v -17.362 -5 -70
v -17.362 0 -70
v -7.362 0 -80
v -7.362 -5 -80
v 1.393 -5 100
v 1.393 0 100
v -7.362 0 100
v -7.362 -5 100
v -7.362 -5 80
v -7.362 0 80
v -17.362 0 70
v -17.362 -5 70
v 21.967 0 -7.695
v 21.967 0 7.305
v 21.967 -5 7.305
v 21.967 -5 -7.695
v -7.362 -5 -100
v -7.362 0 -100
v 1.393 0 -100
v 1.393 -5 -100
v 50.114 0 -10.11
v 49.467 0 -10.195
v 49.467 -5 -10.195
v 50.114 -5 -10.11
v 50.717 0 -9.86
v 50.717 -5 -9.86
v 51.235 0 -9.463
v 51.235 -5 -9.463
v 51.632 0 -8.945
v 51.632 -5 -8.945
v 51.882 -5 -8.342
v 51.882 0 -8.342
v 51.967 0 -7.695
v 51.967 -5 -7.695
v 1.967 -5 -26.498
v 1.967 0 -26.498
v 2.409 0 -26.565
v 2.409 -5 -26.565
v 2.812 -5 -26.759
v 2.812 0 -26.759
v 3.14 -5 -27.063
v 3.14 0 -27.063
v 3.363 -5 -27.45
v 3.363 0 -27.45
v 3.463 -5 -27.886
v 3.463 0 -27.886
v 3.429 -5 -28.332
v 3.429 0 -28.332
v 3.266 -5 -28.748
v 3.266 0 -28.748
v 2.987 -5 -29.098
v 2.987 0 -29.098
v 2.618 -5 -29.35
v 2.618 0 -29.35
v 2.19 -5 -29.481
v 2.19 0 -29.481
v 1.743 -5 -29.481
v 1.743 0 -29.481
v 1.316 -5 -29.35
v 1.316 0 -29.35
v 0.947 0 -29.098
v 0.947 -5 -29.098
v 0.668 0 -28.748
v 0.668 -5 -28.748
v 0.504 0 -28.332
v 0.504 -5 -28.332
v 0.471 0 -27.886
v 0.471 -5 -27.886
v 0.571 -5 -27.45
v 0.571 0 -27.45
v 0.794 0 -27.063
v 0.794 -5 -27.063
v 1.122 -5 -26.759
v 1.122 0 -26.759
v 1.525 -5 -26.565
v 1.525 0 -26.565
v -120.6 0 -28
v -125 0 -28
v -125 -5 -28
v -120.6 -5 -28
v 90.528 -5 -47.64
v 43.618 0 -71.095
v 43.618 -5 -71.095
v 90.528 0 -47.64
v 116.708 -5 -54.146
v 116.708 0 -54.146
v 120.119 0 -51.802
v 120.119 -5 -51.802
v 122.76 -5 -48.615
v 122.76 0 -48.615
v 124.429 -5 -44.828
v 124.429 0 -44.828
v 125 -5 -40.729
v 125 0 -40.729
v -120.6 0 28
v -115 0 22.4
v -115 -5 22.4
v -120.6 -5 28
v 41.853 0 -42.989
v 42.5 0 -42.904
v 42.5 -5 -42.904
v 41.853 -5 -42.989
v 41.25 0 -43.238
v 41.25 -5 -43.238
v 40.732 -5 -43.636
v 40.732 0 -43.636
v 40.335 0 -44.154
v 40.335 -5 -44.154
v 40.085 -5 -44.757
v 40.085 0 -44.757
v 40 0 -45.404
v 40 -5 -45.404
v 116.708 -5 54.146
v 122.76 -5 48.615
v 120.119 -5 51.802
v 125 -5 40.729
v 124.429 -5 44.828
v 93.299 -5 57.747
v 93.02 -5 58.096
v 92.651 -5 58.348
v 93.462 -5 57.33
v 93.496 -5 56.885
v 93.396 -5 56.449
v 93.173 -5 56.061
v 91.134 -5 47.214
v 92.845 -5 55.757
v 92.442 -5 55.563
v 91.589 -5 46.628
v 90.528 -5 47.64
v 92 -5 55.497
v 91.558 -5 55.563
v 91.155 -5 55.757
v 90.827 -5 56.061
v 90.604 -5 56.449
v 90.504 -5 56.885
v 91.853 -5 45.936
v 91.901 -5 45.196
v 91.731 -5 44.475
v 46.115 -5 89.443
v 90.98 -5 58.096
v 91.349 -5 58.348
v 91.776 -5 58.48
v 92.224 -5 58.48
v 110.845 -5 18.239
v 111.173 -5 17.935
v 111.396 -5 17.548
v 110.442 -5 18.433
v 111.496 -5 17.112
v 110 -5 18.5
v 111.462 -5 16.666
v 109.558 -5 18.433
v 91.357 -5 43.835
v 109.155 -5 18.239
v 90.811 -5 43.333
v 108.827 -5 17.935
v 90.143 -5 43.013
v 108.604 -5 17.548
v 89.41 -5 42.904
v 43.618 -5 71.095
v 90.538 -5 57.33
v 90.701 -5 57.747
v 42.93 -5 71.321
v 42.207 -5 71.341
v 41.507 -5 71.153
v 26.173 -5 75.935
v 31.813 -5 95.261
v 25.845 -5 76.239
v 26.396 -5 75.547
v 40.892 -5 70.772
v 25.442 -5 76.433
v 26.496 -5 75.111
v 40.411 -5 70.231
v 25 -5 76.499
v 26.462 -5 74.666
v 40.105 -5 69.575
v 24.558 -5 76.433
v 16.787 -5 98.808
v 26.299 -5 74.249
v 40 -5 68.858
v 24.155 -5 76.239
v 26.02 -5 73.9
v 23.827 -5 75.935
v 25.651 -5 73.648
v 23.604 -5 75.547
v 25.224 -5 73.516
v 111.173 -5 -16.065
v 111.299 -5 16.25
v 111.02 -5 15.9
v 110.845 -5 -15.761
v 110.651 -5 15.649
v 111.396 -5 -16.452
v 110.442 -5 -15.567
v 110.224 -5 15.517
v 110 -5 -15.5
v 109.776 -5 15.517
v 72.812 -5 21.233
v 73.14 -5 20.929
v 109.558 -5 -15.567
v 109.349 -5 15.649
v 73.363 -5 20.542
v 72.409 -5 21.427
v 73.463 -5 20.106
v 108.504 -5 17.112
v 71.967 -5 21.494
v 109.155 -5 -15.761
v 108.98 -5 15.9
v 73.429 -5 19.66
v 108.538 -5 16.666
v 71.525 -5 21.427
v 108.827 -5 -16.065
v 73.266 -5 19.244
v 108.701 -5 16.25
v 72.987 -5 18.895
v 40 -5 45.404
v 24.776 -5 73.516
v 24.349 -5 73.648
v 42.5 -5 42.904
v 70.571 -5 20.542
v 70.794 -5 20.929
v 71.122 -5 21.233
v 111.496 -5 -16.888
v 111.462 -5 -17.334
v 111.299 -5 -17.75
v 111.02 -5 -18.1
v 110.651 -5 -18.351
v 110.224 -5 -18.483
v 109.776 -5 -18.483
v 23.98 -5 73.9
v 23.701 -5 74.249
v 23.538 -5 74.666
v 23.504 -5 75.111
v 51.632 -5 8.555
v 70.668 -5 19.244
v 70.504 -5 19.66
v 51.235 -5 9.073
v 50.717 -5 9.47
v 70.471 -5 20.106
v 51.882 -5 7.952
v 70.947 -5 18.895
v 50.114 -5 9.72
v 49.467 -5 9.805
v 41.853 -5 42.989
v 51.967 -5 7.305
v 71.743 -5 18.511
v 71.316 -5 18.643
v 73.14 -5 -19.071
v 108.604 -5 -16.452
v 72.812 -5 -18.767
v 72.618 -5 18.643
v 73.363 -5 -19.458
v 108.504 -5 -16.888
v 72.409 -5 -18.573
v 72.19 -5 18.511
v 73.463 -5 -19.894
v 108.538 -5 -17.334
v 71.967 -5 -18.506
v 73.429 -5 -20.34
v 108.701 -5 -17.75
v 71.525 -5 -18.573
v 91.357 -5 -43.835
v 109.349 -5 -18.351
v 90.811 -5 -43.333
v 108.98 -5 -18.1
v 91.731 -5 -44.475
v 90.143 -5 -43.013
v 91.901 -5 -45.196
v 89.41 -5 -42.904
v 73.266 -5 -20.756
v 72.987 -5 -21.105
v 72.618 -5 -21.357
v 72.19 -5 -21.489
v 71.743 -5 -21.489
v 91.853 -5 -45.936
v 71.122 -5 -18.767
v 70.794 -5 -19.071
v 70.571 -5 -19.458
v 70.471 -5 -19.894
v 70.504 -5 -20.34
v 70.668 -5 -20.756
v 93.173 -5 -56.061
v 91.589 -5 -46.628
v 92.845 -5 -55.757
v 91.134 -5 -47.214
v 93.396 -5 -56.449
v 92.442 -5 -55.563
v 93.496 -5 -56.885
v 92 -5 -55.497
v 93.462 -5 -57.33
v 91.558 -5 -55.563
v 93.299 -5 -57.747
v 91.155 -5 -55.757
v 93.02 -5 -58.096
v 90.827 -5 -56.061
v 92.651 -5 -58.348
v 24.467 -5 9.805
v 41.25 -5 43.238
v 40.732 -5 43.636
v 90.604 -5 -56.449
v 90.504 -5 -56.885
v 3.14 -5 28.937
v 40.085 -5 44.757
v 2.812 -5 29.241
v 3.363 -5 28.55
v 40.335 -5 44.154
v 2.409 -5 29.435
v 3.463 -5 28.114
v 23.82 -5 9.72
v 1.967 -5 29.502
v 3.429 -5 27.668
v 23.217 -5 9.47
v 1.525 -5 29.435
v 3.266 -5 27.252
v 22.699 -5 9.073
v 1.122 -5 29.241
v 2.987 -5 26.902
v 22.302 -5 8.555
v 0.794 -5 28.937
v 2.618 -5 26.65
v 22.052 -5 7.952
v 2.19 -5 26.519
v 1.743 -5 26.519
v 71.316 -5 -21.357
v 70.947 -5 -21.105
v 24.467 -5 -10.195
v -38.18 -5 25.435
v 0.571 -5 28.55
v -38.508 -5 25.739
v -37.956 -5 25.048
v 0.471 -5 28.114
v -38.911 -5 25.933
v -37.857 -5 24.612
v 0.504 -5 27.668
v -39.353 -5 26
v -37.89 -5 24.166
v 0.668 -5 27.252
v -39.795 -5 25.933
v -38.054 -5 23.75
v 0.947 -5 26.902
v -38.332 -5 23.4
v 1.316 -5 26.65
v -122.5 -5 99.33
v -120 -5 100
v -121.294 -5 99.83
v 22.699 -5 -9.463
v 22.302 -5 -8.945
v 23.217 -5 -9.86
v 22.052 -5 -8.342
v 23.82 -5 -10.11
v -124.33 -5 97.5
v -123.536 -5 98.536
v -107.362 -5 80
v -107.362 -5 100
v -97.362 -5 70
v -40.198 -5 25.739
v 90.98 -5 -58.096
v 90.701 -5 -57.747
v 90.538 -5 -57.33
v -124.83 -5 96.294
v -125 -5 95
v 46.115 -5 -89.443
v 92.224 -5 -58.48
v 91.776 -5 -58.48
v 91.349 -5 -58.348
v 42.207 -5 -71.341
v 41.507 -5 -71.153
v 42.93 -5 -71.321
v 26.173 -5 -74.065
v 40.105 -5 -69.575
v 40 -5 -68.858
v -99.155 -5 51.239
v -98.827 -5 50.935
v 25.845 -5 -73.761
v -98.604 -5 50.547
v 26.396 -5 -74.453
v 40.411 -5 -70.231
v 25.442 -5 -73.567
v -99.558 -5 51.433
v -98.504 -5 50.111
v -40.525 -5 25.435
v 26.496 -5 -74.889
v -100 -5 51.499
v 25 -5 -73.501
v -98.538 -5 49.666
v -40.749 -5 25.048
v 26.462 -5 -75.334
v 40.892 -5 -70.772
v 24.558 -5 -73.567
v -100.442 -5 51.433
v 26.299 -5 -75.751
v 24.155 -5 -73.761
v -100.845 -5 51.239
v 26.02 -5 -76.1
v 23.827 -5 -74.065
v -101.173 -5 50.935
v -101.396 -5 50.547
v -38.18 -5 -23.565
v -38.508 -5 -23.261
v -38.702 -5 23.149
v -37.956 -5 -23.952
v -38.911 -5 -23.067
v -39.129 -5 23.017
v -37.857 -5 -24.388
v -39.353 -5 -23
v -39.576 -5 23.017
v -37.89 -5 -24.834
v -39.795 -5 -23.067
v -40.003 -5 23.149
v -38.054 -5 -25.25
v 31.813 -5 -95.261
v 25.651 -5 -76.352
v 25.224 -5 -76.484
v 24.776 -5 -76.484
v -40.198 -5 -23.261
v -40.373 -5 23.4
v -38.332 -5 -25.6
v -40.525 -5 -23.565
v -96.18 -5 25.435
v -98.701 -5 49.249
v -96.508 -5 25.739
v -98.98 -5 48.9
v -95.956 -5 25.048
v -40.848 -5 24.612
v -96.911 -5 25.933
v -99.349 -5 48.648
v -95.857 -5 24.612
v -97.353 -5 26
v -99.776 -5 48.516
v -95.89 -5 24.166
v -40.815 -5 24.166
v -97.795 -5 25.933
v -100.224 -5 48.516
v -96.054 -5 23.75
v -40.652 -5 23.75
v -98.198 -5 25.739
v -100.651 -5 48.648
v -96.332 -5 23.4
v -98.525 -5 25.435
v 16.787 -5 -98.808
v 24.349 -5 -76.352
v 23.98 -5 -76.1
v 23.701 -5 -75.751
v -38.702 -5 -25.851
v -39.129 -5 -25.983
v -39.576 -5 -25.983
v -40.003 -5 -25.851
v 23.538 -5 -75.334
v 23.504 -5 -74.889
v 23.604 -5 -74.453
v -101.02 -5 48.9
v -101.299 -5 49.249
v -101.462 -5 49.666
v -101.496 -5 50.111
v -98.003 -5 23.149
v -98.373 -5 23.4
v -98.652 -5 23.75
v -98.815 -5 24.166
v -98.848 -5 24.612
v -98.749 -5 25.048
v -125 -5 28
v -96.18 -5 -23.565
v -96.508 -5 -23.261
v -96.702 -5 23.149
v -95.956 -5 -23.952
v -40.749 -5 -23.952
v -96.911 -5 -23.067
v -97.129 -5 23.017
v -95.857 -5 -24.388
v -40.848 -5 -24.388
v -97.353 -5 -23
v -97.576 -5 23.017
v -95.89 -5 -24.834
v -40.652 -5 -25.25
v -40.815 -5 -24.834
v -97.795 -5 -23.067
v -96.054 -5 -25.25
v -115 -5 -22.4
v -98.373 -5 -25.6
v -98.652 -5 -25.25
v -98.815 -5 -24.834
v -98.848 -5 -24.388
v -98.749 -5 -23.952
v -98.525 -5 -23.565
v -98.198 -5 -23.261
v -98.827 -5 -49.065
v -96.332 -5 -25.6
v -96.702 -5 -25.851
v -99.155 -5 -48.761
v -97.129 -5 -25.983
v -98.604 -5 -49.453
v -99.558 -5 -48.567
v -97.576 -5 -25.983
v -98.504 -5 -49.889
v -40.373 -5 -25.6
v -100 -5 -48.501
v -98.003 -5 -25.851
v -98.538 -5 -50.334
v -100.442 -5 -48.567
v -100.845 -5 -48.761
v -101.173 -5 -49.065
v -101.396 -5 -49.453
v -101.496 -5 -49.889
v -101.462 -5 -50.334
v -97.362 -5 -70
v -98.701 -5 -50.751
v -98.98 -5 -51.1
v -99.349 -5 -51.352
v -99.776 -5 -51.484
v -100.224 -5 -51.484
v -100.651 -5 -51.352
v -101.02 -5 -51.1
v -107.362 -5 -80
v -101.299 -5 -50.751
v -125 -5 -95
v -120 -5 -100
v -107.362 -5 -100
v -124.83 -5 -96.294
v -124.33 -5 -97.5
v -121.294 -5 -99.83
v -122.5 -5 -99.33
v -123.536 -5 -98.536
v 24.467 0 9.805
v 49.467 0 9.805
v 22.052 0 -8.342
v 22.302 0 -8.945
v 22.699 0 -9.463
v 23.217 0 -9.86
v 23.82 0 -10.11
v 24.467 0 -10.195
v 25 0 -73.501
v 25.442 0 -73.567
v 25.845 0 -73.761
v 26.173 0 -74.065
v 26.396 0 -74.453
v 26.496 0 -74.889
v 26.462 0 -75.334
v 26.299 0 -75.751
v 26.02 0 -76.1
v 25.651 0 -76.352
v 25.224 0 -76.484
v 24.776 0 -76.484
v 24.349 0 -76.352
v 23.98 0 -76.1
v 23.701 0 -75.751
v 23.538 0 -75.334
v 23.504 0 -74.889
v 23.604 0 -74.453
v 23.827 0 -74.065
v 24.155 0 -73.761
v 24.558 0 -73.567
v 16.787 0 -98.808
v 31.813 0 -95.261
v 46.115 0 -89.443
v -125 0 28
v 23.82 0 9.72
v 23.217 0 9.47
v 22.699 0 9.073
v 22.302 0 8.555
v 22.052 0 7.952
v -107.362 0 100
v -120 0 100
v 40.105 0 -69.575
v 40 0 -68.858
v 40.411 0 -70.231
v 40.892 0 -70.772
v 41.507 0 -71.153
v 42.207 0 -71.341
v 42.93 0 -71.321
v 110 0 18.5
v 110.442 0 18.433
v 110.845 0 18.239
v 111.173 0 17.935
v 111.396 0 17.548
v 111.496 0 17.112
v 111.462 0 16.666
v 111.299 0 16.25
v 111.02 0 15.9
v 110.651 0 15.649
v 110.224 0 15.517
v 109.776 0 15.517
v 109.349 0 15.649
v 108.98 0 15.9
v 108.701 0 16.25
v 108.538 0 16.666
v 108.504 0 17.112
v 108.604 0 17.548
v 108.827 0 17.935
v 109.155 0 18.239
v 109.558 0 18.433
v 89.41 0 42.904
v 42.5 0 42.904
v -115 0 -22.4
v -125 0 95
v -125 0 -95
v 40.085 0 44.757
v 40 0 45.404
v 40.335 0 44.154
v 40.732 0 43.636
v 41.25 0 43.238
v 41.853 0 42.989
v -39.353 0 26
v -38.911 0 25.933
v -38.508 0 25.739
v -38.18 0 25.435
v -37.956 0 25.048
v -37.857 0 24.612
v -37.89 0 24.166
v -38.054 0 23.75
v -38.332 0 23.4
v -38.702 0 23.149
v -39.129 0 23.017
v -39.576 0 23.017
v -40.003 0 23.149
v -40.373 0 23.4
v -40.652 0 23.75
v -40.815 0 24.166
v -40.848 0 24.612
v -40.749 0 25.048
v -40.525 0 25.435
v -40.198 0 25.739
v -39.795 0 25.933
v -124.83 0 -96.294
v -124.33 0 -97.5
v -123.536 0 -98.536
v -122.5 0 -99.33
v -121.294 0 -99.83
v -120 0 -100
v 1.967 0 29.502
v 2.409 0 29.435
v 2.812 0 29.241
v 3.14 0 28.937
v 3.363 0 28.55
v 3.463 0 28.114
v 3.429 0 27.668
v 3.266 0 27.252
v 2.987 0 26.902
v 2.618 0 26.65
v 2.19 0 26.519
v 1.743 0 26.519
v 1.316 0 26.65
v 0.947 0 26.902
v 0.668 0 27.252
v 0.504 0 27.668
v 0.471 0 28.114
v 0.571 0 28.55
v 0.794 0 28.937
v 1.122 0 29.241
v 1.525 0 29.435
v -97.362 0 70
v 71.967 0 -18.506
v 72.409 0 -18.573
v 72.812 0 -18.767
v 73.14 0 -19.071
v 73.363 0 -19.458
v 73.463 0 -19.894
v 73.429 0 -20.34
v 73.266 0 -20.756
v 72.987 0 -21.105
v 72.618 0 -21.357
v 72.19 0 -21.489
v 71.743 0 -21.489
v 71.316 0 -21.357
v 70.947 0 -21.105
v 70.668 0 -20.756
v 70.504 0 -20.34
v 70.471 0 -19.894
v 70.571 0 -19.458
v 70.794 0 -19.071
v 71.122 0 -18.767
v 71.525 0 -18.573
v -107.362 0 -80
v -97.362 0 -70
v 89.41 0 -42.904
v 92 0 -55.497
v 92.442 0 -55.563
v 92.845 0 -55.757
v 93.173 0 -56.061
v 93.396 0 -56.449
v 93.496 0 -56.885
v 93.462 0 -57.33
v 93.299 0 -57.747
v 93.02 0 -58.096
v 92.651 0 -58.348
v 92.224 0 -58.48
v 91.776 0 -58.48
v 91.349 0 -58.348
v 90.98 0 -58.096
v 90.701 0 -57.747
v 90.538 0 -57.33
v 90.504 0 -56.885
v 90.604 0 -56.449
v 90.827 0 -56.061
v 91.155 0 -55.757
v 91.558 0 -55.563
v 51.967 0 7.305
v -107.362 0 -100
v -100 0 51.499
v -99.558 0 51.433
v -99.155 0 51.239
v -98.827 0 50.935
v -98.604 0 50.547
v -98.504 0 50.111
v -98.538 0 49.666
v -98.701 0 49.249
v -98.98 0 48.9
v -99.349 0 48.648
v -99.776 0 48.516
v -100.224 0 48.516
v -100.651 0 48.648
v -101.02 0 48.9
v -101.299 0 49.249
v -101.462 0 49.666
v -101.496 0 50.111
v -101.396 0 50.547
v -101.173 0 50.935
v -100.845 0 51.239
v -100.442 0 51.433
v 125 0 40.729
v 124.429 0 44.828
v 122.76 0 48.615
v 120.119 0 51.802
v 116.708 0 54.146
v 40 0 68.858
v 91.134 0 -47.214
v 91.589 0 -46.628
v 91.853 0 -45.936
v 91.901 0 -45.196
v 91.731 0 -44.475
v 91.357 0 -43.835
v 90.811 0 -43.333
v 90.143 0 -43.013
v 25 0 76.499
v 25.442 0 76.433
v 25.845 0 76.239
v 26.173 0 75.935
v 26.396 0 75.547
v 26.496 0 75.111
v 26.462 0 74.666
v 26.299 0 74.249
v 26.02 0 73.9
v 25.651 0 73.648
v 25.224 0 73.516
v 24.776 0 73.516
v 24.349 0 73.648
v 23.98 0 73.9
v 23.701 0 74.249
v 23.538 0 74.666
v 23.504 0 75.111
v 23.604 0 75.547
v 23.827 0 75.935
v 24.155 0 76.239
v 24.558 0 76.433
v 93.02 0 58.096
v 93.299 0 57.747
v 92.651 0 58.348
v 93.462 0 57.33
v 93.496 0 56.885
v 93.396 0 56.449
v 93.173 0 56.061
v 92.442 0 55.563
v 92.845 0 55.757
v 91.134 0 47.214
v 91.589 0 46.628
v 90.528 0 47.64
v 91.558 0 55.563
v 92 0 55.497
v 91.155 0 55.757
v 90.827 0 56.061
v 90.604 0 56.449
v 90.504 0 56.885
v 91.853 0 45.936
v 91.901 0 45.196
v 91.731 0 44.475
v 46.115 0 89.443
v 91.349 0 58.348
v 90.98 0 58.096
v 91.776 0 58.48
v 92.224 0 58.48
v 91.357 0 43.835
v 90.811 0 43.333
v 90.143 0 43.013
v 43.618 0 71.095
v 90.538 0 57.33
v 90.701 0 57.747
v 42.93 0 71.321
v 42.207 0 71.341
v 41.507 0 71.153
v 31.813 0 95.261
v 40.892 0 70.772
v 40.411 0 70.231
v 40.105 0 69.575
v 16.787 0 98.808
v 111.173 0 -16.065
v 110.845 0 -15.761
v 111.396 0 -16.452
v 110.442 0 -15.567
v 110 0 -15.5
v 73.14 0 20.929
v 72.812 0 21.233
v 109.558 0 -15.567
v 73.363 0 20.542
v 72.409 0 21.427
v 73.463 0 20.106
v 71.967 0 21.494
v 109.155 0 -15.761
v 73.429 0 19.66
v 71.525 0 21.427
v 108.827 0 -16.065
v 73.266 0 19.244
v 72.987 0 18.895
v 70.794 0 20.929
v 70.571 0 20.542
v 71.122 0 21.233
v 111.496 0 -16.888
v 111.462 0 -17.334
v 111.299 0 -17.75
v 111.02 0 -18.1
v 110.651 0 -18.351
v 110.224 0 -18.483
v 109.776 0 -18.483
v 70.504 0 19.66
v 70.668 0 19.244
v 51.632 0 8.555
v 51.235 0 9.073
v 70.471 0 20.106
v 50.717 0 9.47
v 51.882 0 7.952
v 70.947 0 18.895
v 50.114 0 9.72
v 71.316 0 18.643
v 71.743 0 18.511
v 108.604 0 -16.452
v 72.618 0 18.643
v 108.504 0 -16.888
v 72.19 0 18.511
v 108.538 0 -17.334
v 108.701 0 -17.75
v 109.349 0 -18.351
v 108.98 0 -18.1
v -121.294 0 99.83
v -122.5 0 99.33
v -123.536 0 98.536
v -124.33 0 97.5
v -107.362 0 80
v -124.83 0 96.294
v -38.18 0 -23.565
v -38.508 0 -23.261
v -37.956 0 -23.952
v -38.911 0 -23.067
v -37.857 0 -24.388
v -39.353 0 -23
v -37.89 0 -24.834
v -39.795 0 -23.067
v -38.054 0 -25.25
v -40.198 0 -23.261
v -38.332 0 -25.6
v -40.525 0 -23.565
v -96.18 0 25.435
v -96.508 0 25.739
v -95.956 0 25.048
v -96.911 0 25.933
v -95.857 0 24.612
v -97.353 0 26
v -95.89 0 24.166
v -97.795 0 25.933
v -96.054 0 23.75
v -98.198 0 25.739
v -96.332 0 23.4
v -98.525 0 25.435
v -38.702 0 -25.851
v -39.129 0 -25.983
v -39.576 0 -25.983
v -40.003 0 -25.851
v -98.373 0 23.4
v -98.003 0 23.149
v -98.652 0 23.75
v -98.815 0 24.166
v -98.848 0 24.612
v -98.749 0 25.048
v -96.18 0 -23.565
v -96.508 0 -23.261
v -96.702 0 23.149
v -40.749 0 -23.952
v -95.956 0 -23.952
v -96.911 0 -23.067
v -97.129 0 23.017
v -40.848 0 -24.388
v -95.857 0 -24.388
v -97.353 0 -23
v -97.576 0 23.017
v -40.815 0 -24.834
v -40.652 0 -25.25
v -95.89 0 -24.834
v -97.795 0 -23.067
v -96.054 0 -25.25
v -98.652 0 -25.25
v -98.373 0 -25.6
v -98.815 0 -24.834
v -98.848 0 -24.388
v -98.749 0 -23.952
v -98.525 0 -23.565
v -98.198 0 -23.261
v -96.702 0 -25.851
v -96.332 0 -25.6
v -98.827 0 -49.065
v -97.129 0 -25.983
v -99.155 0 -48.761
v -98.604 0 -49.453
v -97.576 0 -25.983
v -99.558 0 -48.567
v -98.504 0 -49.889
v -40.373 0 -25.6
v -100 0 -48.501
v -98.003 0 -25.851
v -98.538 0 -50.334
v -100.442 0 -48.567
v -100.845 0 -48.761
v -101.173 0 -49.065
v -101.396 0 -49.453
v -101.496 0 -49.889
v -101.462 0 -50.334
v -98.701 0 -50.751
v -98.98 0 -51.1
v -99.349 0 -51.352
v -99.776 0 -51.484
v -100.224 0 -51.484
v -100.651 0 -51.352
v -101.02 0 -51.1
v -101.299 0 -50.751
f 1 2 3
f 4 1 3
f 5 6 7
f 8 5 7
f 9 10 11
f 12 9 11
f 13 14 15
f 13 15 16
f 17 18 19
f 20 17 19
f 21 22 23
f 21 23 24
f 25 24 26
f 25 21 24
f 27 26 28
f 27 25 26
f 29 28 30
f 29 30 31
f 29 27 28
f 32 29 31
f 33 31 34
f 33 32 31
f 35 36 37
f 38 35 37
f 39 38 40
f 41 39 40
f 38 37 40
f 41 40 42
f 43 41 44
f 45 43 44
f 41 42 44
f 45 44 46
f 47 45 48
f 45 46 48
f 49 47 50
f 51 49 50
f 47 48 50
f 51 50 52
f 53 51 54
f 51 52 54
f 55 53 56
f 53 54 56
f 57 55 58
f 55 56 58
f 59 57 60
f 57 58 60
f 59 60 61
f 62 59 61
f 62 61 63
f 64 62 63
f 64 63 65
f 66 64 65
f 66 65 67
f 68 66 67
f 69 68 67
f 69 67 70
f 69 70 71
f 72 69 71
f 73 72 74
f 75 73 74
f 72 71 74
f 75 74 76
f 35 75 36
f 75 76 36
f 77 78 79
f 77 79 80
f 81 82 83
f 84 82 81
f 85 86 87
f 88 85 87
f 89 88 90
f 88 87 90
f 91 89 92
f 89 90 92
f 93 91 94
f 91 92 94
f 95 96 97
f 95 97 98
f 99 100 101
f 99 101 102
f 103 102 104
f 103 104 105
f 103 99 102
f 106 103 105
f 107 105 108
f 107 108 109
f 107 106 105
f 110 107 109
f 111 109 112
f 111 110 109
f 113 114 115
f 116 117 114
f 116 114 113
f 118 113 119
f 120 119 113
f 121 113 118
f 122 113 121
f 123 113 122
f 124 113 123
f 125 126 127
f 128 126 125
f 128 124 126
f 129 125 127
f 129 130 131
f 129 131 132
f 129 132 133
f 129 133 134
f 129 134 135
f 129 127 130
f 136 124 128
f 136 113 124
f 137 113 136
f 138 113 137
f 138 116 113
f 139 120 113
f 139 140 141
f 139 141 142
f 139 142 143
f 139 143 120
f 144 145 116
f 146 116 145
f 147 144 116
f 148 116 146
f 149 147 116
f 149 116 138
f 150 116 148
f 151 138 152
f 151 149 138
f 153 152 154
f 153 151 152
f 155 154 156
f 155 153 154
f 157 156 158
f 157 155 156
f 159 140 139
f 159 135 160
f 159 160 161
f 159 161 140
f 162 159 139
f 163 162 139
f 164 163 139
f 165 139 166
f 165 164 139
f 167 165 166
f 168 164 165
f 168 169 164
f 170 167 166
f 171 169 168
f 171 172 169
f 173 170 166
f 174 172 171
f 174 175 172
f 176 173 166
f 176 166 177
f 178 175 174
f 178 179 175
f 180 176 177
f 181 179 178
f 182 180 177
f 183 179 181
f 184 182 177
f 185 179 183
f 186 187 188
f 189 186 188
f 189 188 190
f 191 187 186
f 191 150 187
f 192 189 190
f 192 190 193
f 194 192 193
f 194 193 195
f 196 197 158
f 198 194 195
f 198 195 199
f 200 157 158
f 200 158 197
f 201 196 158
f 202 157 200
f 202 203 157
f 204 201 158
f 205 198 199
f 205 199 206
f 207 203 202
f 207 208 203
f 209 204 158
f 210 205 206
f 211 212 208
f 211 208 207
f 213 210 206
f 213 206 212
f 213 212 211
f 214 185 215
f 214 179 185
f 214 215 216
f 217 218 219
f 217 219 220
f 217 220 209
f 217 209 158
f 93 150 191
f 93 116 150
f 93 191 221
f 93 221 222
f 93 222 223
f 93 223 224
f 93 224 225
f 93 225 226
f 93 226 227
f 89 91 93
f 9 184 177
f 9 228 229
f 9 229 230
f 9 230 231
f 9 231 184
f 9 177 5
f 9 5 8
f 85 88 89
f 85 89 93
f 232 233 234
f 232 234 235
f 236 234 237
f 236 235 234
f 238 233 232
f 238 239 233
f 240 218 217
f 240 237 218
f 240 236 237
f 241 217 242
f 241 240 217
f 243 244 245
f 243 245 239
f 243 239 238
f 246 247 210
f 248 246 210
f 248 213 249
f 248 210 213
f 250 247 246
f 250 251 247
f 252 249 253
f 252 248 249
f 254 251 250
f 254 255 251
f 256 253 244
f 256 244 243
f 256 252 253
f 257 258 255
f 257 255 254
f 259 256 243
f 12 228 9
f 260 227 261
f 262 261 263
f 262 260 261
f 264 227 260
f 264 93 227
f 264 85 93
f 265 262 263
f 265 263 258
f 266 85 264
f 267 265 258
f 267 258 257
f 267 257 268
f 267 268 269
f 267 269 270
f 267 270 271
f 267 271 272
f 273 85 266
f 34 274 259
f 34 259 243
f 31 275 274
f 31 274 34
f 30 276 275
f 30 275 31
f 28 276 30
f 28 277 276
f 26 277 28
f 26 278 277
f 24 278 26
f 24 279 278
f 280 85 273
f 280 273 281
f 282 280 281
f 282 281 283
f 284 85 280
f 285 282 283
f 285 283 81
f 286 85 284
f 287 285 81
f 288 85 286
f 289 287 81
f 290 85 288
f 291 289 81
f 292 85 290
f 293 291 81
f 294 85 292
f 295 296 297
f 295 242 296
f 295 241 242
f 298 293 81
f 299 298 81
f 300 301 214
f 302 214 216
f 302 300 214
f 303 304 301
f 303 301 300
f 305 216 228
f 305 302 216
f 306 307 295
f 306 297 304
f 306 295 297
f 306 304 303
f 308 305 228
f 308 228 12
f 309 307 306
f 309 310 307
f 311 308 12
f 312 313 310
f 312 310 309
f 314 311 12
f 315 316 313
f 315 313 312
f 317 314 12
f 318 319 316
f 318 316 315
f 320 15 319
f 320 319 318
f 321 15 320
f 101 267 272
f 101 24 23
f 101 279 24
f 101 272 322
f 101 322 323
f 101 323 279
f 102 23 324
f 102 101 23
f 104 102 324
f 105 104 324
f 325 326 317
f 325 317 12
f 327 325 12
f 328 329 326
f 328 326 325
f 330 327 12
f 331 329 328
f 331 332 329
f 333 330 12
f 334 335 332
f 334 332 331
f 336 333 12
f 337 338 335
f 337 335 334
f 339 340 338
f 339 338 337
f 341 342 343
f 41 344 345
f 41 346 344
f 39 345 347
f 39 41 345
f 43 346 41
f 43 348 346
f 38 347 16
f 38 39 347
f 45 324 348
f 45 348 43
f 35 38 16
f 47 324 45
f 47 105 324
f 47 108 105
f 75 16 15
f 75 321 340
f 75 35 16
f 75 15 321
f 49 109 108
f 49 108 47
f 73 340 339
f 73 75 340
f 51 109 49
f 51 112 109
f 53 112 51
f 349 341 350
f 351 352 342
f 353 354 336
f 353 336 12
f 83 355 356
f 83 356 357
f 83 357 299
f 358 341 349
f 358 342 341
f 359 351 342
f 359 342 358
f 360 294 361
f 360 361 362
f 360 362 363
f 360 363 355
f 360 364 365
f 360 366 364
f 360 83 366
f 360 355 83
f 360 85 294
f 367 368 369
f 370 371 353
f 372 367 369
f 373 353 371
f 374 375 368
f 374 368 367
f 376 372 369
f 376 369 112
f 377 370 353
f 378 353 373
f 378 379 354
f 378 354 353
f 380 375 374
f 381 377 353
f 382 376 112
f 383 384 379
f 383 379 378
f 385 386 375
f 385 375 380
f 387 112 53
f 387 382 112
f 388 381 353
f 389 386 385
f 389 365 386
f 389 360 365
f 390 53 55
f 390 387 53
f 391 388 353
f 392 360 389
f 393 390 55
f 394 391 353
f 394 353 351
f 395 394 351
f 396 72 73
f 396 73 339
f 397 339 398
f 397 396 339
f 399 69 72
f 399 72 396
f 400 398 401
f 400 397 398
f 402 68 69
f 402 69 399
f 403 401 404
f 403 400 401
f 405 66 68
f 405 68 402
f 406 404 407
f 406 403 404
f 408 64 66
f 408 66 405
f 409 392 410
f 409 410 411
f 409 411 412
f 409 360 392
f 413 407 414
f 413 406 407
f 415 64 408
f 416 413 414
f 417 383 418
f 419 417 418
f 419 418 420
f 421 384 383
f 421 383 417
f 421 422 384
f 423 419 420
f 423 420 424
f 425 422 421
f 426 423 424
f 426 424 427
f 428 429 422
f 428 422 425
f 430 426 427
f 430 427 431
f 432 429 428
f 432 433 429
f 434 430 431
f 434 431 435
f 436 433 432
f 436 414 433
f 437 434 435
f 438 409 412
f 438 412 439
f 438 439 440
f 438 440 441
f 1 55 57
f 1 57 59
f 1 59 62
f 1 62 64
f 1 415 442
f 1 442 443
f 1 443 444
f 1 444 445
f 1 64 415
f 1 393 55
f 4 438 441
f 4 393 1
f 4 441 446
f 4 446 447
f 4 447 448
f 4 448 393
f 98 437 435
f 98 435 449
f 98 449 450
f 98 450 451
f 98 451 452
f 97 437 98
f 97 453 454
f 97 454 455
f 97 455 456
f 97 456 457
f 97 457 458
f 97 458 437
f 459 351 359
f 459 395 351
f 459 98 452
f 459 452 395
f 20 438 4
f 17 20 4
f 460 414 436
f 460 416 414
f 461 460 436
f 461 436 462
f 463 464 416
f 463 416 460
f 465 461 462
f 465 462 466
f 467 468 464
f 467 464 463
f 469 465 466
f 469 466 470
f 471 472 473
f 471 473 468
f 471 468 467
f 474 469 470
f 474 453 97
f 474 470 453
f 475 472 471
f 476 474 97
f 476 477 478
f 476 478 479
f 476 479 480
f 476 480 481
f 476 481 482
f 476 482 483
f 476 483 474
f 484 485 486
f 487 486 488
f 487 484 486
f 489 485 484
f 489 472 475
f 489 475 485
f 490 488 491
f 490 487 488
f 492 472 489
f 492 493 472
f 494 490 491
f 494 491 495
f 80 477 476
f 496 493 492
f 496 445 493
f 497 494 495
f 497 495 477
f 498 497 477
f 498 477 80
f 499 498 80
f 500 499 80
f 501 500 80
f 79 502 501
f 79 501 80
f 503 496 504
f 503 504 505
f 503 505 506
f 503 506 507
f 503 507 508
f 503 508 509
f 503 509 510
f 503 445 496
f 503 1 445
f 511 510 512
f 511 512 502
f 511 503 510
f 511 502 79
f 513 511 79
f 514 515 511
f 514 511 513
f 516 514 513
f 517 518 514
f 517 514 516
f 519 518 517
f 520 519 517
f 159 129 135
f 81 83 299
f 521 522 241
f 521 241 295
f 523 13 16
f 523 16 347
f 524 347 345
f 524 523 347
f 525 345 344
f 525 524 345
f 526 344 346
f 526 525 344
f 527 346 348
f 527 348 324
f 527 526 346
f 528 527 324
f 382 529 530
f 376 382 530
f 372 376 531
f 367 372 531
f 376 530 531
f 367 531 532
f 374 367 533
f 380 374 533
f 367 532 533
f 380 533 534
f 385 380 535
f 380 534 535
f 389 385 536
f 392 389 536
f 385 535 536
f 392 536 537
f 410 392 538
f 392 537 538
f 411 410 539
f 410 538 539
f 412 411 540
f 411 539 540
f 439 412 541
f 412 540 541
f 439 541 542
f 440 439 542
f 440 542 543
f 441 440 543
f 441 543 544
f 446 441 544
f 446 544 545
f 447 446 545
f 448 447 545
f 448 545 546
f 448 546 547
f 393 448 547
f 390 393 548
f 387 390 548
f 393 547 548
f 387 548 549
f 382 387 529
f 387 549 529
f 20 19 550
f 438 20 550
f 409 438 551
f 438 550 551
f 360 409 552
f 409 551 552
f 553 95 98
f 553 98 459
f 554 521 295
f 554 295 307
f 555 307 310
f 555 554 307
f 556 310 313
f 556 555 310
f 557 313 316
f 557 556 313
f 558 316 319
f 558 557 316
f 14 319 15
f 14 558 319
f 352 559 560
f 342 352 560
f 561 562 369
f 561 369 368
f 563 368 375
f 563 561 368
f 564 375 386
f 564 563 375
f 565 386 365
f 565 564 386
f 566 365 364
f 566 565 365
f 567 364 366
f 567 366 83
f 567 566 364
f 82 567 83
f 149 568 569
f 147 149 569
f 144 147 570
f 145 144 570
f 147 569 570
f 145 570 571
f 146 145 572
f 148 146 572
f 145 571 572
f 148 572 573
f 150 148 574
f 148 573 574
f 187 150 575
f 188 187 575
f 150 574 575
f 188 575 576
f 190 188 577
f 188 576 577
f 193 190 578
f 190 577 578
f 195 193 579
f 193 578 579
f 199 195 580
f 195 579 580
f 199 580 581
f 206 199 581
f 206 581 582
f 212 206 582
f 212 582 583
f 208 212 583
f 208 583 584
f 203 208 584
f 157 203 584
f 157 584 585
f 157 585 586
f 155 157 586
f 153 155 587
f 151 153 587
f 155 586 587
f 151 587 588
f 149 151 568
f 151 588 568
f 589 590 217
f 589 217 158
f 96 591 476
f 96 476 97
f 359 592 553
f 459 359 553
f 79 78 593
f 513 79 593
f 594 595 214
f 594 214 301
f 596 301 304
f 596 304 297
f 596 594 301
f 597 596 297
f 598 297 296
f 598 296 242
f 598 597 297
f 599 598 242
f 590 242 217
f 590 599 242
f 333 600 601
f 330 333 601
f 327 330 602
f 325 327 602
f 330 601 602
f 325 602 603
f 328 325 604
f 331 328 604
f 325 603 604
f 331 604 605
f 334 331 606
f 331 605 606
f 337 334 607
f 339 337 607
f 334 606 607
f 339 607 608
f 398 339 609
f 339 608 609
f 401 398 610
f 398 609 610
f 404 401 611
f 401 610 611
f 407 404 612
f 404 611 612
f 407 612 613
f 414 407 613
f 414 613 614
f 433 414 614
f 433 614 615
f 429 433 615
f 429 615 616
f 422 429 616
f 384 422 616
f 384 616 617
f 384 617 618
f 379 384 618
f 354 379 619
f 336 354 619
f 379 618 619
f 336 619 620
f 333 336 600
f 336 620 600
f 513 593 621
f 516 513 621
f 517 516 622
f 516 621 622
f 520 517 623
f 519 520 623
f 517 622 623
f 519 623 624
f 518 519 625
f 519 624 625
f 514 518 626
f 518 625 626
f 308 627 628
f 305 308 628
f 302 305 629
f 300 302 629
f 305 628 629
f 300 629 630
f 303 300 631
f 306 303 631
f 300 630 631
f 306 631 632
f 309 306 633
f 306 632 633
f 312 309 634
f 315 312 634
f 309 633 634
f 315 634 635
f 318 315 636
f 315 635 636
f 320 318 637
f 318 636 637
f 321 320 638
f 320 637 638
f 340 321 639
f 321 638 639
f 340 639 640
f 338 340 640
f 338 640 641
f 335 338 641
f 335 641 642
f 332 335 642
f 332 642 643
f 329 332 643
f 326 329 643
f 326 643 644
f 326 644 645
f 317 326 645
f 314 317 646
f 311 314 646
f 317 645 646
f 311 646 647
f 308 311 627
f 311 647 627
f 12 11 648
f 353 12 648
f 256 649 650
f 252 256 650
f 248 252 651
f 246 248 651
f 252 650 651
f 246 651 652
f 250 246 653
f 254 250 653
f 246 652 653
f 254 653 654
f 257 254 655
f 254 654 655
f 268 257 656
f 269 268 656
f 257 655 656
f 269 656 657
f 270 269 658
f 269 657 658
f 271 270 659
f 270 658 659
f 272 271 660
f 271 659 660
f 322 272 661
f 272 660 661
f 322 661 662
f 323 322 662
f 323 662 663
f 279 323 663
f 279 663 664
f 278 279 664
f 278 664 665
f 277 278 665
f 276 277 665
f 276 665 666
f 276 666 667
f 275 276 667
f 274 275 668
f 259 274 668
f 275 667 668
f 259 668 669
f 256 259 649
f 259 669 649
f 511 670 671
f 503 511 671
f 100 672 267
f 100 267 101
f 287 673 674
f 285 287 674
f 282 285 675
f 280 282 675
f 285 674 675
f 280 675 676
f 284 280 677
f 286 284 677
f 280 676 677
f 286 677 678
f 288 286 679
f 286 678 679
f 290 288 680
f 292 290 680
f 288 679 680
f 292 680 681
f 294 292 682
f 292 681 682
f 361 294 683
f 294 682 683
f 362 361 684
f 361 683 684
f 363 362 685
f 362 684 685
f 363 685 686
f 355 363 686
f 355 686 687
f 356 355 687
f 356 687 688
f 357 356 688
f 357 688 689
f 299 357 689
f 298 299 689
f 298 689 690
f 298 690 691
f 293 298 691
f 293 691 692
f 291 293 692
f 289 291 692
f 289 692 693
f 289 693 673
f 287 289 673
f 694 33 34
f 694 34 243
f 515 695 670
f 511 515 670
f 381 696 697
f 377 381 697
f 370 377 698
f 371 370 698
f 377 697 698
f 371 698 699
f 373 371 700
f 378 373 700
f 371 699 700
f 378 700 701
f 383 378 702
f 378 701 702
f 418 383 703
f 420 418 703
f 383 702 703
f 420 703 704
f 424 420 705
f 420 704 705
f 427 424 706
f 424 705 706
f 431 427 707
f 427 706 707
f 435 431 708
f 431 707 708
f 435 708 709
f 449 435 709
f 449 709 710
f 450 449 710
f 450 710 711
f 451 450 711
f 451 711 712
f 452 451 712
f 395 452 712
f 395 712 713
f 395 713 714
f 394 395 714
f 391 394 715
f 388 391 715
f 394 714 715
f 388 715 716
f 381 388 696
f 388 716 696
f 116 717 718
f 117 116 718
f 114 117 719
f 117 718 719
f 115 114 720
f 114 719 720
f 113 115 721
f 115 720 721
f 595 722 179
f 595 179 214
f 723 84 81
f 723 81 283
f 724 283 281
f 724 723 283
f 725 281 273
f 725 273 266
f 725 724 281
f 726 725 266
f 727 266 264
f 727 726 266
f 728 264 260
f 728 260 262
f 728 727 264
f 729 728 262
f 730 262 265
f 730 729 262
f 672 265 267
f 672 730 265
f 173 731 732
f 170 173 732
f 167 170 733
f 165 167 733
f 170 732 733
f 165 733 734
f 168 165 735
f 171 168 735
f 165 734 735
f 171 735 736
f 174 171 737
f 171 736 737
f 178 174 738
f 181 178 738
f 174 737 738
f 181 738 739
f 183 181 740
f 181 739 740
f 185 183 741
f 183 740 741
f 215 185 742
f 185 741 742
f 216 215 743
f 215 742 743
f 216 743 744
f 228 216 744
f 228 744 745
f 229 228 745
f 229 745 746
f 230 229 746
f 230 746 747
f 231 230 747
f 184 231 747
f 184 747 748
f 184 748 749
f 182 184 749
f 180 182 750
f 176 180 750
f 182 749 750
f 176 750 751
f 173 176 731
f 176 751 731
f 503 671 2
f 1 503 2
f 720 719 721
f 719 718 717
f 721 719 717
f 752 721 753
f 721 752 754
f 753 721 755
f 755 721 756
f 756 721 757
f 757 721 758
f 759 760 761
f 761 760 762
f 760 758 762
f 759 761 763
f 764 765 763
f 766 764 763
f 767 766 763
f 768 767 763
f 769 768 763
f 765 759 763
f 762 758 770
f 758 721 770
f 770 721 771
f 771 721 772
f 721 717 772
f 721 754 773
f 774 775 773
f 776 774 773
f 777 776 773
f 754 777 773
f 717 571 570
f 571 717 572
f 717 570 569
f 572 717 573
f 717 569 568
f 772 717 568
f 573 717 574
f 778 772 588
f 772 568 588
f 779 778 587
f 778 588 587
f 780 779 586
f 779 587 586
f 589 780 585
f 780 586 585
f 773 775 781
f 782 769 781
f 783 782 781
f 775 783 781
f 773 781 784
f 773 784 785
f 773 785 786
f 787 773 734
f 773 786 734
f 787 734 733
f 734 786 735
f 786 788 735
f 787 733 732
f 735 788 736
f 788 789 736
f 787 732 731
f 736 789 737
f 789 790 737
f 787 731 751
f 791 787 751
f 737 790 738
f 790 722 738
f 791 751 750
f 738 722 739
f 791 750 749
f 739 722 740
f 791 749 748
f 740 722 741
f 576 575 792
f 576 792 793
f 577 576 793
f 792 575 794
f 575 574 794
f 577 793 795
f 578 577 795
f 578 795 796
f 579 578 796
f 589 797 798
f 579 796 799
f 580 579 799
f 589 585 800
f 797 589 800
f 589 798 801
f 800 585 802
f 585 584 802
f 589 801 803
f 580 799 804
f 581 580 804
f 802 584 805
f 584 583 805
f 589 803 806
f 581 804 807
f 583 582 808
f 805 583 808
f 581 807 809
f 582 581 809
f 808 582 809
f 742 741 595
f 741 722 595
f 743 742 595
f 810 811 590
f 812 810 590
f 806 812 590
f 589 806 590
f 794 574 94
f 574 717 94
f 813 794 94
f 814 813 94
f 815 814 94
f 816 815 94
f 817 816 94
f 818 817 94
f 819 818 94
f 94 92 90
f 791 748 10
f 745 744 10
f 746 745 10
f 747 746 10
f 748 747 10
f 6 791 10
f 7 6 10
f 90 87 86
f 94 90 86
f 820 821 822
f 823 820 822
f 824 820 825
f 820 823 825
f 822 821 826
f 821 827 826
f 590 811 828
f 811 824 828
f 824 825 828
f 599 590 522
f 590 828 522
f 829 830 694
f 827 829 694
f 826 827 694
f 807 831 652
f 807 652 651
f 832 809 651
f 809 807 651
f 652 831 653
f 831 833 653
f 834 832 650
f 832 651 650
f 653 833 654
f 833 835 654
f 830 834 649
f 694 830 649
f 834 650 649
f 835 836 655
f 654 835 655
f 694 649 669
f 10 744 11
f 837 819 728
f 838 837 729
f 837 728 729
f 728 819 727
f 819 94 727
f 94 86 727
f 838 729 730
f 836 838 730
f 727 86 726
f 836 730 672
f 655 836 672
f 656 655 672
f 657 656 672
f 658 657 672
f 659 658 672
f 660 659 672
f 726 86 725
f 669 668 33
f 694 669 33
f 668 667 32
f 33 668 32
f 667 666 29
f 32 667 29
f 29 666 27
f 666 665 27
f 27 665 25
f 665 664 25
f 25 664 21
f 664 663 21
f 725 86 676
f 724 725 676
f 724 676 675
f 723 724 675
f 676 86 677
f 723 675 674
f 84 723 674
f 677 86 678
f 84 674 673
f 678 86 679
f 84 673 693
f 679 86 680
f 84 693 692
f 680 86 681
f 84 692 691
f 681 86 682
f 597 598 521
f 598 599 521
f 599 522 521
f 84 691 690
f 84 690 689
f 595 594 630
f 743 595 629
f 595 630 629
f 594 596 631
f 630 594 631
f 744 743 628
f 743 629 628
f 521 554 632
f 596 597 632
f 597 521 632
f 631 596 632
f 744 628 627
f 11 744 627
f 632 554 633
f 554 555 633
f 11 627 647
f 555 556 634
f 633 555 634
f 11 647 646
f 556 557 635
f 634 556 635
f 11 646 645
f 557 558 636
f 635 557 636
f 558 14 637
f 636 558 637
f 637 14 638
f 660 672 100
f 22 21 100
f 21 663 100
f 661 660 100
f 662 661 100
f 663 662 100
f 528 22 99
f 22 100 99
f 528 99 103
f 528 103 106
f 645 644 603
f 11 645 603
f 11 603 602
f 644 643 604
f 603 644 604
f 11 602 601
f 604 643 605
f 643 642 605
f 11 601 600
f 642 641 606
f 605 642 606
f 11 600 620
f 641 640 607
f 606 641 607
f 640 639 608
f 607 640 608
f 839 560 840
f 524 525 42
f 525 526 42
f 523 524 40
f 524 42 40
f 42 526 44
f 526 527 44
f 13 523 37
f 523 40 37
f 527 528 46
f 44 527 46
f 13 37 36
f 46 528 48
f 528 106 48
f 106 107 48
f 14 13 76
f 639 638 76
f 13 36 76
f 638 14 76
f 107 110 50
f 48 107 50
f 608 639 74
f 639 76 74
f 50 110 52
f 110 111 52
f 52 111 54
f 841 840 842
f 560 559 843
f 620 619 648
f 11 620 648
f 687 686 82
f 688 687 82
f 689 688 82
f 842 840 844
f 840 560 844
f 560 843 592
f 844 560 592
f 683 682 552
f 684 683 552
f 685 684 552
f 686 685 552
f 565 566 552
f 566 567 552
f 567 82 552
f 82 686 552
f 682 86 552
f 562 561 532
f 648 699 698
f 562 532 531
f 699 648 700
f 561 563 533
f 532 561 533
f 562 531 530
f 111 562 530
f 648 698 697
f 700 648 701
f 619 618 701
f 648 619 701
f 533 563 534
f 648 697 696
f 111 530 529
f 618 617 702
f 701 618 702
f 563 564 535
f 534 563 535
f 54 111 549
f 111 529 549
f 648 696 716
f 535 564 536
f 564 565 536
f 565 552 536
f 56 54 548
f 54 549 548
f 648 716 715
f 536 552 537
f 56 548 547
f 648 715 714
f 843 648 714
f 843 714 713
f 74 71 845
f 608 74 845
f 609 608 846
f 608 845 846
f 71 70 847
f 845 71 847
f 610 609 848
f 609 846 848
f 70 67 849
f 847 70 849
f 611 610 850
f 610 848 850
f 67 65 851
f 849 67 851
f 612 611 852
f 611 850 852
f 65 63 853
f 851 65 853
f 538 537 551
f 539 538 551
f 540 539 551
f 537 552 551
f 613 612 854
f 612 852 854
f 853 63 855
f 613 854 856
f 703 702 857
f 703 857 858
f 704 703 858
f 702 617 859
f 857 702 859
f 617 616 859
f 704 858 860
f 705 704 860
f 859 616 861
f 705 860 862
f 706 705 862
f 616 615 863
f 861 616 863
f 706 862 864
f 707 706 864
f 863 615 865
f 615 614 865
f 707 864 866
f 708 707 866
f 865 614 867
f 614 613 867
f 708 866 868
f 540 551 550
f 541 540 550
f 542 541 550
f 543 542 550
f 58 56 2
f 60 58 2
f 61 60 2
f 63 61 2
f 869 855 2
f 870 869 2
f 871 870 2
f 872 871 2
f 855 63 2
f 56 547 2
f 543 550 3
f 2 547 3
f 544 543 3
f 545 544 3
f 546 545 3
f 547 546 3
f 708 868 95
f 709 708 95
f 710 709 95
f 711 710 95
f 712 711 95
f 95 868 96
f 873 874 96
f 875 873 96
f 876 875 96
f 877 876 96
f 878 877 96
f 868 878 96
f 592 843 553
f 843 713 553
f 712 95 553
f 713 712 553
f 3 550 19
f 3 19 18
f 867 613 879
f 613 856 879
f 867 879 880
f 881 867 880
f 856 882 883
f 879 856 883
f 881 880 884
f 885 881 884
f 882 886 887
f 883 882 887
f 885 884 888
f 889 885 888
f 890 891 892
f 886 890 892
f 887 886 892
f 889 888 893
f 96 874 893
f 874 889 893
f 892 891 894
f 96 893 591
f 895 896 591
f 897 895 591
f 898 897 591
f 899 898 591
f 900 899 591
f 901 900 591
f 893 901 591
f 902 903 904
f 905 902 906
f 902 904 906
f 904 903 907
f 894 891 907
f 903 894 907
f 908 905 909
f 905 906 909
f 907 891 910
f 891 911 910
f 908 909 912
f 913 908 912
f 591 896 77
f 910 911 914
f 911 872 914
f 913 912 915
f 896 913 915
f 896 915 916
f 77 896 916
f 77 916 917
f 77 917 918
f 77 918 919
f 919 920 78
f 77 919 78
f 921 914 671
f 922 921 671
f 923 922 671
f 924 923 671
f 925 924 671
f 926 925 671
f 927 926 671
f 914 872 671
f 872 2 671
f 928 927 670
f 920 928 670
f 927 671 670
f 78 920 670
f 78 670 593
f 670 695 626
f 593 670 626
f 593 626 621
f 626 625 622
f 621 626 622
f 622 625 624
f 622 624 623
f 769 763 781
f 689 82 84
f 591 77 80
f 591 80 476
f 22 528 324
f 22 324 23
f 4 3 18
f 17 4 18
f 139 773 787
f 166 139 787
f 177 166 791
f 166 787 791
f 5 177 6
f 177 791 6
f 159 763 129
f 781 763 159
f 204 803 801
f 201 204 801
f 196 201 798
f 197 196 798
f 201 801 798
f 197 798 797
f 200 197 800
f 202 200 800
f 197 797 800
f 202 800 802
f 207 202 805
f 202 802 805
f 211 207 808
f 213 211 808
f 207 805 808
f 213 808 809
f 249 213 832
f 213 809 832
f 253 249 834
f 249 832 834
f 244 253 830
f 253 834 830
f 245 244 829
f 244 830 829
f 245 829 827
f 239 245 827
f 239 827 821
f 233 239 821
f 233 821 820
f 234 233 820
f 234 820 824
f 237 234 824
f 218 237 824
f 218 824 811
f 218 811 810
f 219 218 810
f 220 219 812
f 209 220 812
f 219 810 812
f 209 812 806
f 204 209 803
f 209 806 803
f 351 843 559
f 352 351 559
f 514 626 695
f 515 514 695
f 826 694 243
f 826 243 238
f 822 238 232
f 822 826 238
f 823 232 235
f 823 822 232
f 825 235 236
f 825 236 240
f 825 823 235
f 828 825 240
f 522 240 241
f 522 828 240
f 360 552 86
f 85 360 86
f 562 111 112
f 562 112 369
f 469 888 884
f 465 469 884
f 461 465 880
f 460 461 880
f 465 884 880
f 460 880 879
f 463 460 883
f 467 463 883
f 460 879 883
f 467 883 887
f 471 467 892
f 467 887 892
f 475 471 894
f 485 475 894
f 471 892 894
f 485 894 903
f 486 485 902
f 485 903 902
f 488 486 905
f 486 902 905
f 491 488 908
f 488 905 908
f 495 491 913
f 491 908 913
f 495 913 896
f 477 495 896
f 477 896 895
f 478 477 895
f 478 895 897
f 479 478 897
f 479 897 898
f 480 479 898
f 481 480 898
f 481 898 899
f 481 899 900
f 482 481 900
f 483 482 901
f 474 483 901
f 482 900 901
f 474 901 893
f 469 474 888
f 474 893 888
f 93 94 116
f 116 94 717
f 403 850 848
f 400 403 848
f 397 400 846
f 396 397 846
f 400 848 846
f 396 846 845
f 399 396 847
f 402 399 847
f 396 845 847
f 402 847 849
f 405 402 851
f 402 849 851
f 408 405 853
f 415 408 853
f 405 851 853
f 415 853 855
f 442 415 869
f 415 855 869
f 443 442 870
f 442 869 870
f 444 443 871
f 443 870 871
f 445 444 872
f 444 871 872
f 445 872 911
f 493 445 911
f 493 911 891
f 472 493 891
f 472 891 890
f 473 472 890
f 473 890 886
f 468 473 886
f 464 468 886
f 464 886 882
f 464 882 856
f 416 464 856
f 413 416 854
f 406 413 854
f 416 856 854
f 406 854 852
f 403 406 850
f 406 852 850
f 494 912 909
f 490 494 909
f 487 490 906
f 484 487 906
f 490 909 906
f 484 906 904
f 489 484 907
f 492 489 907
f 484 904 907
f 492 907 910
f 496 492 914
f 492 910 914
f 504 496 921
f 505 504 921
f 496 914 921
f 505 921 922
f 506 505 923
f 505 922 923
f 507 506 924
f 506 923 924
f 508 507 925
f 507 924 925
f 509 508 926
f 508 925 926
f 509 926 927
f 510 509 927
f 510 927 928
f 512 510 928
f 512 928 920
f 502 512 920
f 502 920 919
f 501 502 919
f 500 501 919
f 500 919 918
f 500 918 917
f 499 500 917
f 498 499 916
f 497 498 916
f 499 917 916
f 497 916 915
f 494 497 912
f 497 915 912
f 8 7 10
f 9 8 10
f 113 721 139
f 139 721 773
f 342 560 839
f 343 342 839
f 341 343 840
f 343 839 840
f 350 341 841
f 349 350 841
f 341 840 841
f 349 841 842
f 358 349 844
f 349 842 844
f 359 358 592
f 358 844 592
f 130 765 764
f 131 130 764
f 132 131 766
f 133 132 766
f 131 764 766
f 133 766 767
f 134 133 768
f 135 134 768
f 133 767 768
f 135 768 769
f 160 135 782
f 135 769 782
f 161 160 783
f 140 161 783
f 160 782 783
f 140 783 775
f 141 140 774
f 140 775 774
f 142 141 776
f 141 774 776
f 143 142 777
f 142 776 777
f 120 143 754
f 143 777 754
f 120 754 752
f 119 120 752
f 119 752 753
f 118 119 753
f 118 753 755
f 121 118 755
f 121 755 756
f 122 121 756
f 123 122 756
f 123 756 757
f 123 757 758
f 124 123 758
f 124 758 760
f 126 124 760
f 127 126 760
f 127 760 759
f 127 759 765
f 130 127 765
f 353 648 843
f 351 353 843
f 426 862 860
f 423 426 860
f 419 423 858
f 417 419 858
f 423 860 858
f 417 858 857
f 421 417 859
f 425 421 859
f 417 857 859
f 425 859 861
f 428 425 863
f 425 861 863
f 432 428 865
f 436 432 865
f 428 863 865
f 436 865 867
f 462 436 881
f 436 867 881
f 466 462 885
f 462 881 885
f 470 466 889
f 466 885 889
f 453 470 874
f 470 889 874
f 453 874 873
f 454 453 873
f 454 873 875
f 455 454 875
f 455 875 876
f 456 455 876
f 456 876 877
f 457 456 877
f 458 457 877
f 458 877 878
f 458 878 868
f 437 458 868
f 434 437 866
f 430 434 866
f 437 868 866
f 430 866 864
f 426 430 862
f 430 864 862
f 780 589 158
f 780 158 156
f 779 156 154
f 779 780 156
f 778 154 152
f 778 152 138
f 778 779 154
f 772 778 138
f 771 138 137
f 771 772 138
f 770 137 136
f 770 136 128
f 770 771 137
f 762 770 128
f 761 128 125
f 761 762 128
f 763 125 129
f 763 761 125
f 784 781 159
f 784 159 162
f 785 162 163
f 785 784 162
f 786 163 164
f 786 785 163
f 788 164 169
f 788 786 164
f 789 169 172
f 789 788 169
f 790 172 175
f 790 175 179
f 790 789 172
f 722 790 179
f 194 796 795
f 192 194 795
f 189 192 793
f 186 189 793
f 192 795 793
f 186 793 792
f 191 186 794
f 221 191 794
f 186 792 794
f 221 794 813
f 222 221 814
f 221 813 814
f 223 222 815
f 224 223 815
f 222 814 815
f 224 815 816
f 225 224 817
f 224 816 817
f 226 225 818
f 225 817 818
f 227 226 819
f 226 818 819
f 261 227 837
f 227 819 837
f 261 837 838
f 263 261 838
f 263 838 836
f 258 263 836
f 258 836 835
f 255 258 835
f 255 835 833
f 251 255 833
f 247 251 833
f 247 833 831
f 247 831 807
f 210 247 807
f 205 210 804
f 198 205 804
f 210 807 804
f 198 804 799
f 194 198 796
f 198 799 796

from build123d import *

# Parameters (mm, degrees)
BOSS_EXTRUDE2_DEPTH = 5
SKETCH7_R           = 1.5
CUT_EXTRUDE6_DEPTH  = 5
SKETCH2_R           = 1.5
CUT_EXTRUDE7_DEPTH  = 5
SKETCH4_R           = 1.5
CUT_EXTRUDE8_DEPTH  = 5
SKETCH10_R          = 1.5
CUT_EXTRUDE9_DEPTH  = 5
CUT_EXTRUDE10_DEPTH = 5
SKETCH15_R          = 1.5
CUT_EXTRUDE11_DEPTH = 161.15617378
CUT_EXTRUDE12_DEPTH = 5


with BuildPart() as part:
    # Sketch1 → Boss-Extrude2 (new body)
    with BuildSketch(Plane(origin=(0, 0, 0), x_dir=(1, 0, 0), z_dir=(0, 1, 0))):
        with BuildLine():
            Line((-120, 100), (-107.361996995, 100))
            Line((-107.361996995, 100), (-107.361996995, 80))
            Line((-107.361996995, 80), (-97.361996995, 70))
            Line((-97.361996995, 70), (-17.361996995, 70))
            Line((-17.361996995, 70), (-7.361996995, 80))
            Line((-7.361996995, 80), (-7.361996995, 100))
            Line((-7.361996995, 100), (1.39320225, 100))
            ThreePointArc((1.39320225, 100), (24.368494305, 97.324898947), (46.1145618, 89.4427191))
            Line((46.1145618, 89.4427191), (116.708203932, 54.145898034))
            ThreePointArc((116.708203932, 54.145898034), (122.759762125, 48.615456851), (125, 40.729490169))
            Line((125, 40.729490169), (125, -40.729490169))
            ThreePointArc((125, -40.729490169), (122.759762125, -48.615456851), (116.708203932, -54.145898034))
            Line((116.708203932, -54.145898034), (46.1145618, -89.4427191))
            ThreePointArc((46.1145618, -89.4427191), (24.368494305, -97.324898947), (1.39320225, -100))
            Line((1.39320225, -100), (-7.361996995, -100))
            Line((-7.361996995, -100), (-7.361996995, -80))
            Line((-7.361996995, -80), (-17.361996995, -70))
            Line((-17.361996995, -70), (-97.361996995, -70))
            Line((-97.361996995, -70), (-107.361996995, -80))
            Line((-107.361996995, -80), (-107.361996995, -100))
            Line((-107.361996995, -100), (-120, -100))
            ThreePointArc((-120, -100), (-123.535533906, -98.535533906), (-125, -95))
            Line((-125, -95), (-125, 95))
            ThreePointArc((-125, 95), (-123.535533906, 98.535533906), (-120, 100))
        make_face()
    extrude(amount=-BOSS_EXTRUDE2_DEPTH)

    # Sketch7 → Cut-Extrude6 (cut)
    with BuildSketch(Plane(origin=(0, 0, 0), x_dir=(1, 0, 0), z_dir=(0, 1, 0))):
        with Locations(Location((1.966861521, 27.998221343, 0), (0, 0, 270))):
            Circle(SKETCH7_R)
        with Locations(Location((71.966861521, 20.005897242, 0), (0, 0, 270))):
            Circle(SKETCH7_R)
        with Locations(Location((1.966861521, -28.001778657, 0), (0, 0, 270))):
            Circle(SKETCH7_R)
        with Locations(Location((71.966861521, -19.994102758, 0), (0, 0, 270))):
            Circle(SKETCH7_R)
        with BuildLine():
            Line((24.466861521, 10.195064991), (49.466861521, 10.195064991))
            ThreePointArc((49.466861521, 10.195064991), (51.234628473, 9.462831944), (51.966861521, 7.695064991))
            Line((51.966861521, 7.695064991), (51.966861521, -7.304935009))
            ThreePointArc((51.966861521, -7.304935009), (51.234628473, -9.072701962), (49.466861521, -9.804935009))
            Line((49.466861521, -9.804935009), (24.466861521, -9.804935009))
            ThreePointArc((24.466861521, -9.804935009), (22.699094568, -9.072701962), (21.966861521, -7.304935009))
            Line((21.966861521, -7.304935009), (21.966861521, 7.695064991))
            ThreePointArc((21.966861521, 7.695064991), (22.699094568, 9.462831944), (24.466861521, 10.195064991))
        make_face()
    extrude(amount=-CUT_EXTRUDE6_DEPTH, mode=Mode.SUBTRACT)

    # Sketch2 → Cut-Extrude7 (cut)
    with BuildSketch(Plane(origin=(0, 0, 0), x_dir=(1, 0, 0), z_dir=(0, 1, 0))):
        with Locations(Location((110, 17, 0), (0, 0, 270))):
            Circle(SKETCH2_R)
        with Locations(Location((110, -17, 0), (0, 0, 270))):
            Circle(SKETCH2_R)
    extrude(amount=-CUT_EXTRUDE7_DEPTH, mode=Mode.SUBTRACT)

    # Sketch4 → Cut-Extrude8 (cut)
    with BuildSketch(Plane(origin=(0, 0, 0), x_dir=(1, 0, 0), z_dir=(0, 1, 0))):
        with Locations(Location((-97.352664983, -24.5, 0), (0, 0, 270))):
            Circle(SKETCH4_R)
        with Locations(Location((-39.352664983, 24.5, 0), (0, 0, 270))):
            Circle(SKETCH4_R)
        with Locations(Location((-97.352664983, 24.5, 0), (0, 0, 270))):
            Circle(SKETCH4_R)
        with Locations(Location((-39.352664983, -24.5, 0), (0, 0, 270))):
            Circle(SKETCH4_R)
    extrude(amount=-CUT_EXTRUDE8_DEPTH, mode=Mode.SUBTRACT)

    # Sketch10 → Cut-Extrude9 (cut)
    with BuildSketch(Plane(origin=(0, 0, 0), x_dir=(1, 0, 0), z_dir=(0, 1, 0))):
        with Locations(Location((-100, 50.00070964, 0), (0, 0, 270))):
            Circle(SKETCH10_R)
        with Locations(Location((-100, -49.99929036, 0), (0, 0, 270))):
            Circle(SKETCH10_R)
        with Locations(Location((25, 75.00070964, 0), (0, 0, 270))):
            Circle(SKETCH10_R)
        with Locations(Location((25, -74.99929036, 0), (0, 0, 270))):
            Circle(SKETCH10_R)
    extrude(amount=-CUT_EXTRUDE9_DEPTH, mode=Mode.SUBTRACT)

    # Sketch11 → Cut-Extrude10 (cut)
    with BuildSketch(Plane(origin=(0, 0, 0), x_dir=(1, 0, 0), z_dir=(0, 1, 0))):
        with BuildLine():
            Line((43.618033989, 71.094545302), (90.527864045, 47.639630274))
            ThreePointArc((90.527864045, 47.639630274), (91.84295253, 44.829179995), (89.409830056, 42.903562297))
            Line((89.409830056, 42.903562297), (42.5, 42.903562297))
            ThreePointArc((42.5, 42.903562297), (40.732233047, 43.635795344), (40, 45.403562297))
            Line((40, 45.403562297), (40, 68.858477325))
            ThreePointArc((40, 68.858477325), (41.18567222, 70.985104346), (43.618033989, 71.094545302))
        make_face()
        with BuildLine():
            Line((40, -68.858477325), (40, -45.403562297))
            ThreePointArc((40, -45.403562297), (40.732233047, -43.635795344), (42.5, -42.903562297))
            Line((42.5, -42.903562297), (89.409830056, -42.903562297))
            ThreePointArc((89.409830056, -42.903562297), (91.84295253, -44.829179995), (90.527864045, -47.639630274))
            Line((90.527864045, -47.639630274), (43.618033989, -71.094545302))
            ThreePointArc((43.618033989, -71.094545302), (41.18567222, -70.985104346), (40, -68.858477325))
        make_face()
    extrude(amount=-CUT_EXTRUDE10_DEPTH, mode=Mode.SUBTRACT)

    # Sketch15 → Cut-Extrude11 (cut, through all)
    with BuildSketch(Plane(origin=(0, 0, 0), x_dir=(1, 0, 0), z_dir=(0, 1, 0))):
        with Locations(Location((92, 56.996711096, 0), (0, 0, 270))):
            Circle(SKETCH15_R)
        with Locations(Location((92, -56.996711096, 0), (0, 0, 90))):
            Circle(SKETCH15_R)
    extrude(amount=-CUT_EXTRUDE11_DEPTH, mode=Mode.SUBTRACT)

    # Sketch16 → Cut-Extrude12 (cut)
    with BuildSketch(Plane(origin=(0, 0, 0), x_dir=(1, 0, 0), z_dir=(0, 1, 0))):
        Polygon((-125, 28), (-120.6, 28), (-115, 22.4), (-115, -22.4), (-120.6, -28), (-125, -28), align=None)
    extrude(amount=-CUT_EXTRUDE12_DEPTH, mode=Mode.SUBTRACT)


solid = part.part
